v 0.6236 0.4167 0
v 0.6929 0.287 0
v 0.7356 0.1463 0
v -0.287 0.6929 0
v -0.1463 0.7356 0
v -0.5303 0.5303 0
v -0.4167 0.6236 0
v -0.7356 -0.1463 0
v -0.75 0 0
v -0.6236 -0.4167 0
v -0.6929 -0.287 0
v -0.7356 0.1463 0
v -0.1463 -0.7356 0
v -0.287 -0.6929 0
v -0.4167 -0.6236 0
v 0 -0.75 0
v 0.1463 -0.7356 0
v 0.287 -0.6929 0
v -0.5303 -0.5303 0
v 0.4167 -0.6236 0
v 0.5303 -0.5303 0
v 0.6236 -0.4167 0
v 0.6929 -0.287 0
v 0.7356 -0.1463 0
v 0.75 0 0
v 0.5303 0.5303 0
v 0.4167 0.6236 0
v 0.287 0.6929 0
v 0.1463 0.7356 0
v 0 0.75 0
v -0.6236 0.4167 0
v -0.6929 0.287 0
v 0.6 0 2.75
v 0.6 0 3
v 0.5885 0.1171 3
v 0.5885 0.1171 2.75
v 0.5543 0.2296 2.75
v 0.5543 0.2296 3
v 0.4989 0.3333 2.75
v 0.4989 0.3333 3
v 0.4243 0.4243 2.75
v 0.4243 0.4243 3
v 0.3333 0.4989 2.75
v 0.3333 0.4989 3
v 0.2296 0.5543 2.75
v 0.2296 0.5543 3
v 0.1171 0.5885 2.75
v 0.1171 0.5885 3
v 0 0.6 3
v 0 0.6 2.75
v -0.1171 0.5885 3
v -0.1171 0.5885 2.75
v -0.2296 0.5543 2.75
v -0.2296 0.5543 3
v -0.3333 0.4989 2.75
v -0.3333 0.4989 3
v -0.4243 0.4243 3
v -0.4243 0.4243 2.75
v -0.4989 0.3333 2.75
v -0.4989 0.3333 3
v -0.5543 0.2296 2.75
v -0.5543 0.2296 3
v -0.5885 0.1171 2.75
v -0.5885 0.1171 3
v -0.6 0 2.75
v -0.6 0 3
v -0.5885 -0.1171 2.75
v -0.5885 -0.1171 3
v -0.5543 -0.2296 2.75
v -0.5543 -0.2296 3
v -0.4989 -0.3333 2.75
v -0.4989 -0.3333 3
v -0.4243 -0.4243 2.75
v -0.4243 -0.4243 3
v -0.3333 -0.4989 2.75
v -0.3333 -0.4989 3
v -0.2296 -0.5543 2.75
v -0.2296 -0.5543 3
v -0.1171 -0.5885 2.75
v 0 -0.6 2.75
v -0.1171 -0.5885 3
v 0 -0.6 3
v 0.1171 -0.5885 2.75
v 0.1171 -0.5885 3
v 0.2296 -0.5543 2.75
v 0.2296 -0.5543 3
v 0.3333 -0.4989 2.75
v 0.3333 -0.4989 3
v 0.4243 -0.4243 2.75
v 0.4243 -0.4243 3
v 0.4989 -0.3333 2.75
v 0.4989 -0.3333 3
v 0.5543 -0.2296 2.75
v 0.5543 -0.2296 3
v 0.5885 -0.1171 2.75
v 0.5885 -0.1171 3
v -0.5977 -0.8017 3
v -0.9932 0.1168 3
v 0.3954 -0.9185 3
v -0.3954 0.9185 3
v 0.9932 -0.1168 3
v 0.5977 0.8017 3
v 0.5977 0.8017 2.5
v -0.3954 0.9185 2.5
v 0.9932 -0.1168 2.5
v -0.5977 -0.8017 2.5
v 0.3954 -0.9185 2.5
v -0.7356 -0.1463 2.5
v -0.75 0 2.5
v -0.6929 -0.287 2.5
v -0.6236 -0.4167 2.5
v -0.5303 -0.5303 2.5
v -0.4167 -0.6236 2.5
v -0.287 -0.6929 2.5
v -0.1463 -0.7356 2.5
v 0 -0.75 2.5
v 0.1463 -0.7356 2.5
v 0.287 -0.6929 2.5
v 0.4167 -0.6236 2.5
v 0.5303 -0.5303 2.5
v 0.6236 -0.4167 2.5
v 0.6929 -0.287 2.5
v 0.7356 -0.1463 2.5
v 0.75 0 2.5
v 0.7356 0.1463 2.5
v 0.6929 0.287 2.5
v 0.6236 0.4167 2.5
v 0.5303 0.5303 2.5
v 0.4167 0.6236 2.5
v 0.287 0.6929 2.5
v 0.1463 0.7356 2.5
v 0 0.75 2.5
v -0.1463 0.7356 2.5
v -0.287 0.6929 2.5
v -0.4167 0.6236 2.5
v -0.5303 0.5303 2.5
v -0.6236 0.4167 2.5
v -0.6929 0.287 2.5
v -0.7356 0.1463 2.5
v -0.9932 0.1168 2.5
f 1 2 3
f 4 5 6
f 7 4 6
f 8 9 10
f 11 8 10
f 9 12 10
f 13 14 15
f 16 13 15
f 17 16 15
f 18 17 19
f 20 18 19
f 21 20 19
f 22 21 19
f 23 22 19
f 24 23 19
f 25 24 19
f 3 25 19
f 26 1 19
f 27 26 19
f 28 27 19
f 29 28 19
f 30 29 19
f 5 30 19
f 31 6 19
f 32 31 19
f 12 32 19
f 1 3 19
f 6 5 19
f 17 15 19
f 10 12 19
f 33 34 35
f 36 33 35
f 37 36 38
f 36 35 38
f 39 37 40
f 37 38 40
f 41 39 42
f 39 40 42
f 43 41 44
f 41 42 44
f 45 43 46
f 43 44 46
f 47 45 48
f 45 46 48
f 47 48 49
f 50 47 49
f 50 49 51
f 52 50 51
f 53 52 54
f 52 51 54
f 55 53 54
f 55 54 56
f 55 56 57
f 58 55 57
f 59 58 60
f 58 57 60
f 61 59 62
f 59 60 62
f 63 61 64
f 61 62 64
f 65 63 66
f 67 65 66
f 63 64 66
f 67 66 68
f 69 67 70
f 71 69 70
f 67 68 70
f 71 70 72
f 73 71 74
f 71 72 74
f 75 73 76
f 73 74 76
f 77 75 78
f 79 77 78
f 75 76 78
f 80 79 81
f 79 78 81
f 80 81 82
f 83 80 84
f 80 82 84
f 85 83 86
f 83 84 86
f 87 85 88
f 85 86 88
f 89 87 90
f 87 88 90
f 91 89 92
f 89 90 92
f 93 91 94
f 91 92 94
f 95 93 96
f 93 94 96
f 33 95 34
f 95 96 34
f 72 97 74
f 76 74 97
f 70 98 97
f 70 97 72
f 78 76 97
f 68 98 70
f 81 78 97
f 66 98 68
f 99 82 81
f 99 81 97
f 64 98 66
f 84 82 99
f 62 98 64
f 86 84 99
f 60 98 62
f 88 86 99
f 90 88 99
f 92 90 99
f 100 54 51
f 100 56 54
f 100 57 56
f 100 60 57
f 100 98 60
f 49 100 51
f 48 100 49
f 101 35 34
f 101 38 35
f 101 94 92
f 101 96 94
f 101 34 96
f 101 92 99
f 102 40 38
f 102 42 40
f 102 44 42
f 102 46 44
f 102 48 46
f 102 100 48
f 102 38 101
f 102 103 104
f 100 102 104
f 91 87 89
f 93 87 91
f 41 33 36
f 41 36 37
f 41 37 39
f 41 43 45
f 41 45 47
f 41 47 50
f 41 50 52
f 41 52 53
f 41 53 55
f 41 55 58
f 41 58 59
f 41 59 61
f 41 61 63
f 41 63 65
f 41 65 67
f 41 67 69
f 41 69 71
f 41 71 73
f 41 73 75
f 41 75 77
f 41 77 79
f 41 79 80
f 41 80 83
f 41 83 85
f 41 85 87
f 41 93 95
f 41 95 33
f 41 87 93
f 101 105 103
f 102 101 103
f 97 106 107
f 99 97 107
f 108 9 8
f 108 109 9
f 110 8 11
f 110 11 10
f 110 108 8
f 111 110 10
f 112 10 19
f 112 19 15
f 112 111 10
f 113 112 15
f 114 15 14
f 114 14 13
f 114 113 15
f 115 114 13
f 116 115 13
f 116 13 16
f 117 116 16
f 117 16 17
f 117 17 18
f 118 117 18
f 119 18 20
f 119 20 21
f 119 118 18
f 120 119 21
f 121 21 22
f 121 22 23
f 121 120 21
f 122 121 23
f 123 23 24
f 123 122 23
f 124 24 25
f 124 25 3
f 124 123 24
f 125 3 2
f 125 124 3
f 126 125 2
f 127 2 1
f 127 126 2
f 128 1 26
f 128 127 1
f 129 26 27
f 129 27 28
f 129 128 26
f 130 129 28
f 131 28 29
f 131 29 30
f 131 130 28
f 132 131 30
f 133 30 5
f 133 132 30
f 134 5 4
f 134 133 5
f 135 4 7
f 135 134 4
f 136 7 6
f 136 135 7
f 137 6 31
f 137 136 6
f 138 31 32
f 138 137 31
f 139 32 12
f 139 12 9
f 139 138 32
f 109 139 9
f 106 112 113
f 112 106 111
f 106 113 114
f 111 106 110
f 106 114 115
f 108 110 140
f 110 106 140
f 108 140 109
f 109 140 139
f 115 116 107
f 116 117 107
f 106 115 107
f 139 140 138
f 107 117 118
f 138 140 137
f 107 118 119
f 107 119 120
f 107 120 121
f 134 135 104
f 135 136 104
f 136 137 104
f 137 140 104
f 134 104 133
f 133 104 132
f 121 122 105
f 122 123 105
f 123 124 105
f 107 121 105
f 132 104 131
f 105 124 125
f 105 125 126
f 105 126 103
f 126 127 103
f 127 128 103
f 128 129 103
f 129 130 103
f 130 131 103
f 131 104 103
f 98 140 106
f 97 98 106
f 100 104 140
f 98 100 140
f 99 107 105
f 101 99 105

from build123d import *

# Parameters (mm, degrees)
F0_W     = 0.75
F0_H     = 2.5
F2_R     = 0.75
F3_DEPTH = 0.5
F4_R     = 0.6
F5_DEPTH = 0.25


with BuildPart() as f1:
    # F0 (on Front) → F1 (revolve)
    with BuildSketch(Plane.XZ):
        with Locations((-0.375, 1.25)):
            Rectangle(F0_W, F0_H)
    revolve(axis=Axis((0, 0, 1.25), (0, 0, 1)))

    # F2 (on face) → F3 (join)
    with BuildSketch(Plane.XY.offset(2.5)):
        Polygon((0.5977295956, 0.80169778), (-0.3954258459, 0.9184979044), (-0.9931554415, 0.1168001244), (-0.5977295956, -0.80169778), (0.3954258459, -0.9184979044), (0.9931554415, -0.1168001244), align=None)
        Circle(F2_R, mode=Mode.SUBTRACT)
        Circle(F2_R)
    extrude(amount=F3_DEPTH)

    # F4 (on face) → F5 (cut)
    with BuildSketch(Plane.XY.offset(3)):
        Circle(F4_R)
    extrude(amount=-F5_DEPTH, mode=Mode.SUBTRACT)


solid = f1.part
